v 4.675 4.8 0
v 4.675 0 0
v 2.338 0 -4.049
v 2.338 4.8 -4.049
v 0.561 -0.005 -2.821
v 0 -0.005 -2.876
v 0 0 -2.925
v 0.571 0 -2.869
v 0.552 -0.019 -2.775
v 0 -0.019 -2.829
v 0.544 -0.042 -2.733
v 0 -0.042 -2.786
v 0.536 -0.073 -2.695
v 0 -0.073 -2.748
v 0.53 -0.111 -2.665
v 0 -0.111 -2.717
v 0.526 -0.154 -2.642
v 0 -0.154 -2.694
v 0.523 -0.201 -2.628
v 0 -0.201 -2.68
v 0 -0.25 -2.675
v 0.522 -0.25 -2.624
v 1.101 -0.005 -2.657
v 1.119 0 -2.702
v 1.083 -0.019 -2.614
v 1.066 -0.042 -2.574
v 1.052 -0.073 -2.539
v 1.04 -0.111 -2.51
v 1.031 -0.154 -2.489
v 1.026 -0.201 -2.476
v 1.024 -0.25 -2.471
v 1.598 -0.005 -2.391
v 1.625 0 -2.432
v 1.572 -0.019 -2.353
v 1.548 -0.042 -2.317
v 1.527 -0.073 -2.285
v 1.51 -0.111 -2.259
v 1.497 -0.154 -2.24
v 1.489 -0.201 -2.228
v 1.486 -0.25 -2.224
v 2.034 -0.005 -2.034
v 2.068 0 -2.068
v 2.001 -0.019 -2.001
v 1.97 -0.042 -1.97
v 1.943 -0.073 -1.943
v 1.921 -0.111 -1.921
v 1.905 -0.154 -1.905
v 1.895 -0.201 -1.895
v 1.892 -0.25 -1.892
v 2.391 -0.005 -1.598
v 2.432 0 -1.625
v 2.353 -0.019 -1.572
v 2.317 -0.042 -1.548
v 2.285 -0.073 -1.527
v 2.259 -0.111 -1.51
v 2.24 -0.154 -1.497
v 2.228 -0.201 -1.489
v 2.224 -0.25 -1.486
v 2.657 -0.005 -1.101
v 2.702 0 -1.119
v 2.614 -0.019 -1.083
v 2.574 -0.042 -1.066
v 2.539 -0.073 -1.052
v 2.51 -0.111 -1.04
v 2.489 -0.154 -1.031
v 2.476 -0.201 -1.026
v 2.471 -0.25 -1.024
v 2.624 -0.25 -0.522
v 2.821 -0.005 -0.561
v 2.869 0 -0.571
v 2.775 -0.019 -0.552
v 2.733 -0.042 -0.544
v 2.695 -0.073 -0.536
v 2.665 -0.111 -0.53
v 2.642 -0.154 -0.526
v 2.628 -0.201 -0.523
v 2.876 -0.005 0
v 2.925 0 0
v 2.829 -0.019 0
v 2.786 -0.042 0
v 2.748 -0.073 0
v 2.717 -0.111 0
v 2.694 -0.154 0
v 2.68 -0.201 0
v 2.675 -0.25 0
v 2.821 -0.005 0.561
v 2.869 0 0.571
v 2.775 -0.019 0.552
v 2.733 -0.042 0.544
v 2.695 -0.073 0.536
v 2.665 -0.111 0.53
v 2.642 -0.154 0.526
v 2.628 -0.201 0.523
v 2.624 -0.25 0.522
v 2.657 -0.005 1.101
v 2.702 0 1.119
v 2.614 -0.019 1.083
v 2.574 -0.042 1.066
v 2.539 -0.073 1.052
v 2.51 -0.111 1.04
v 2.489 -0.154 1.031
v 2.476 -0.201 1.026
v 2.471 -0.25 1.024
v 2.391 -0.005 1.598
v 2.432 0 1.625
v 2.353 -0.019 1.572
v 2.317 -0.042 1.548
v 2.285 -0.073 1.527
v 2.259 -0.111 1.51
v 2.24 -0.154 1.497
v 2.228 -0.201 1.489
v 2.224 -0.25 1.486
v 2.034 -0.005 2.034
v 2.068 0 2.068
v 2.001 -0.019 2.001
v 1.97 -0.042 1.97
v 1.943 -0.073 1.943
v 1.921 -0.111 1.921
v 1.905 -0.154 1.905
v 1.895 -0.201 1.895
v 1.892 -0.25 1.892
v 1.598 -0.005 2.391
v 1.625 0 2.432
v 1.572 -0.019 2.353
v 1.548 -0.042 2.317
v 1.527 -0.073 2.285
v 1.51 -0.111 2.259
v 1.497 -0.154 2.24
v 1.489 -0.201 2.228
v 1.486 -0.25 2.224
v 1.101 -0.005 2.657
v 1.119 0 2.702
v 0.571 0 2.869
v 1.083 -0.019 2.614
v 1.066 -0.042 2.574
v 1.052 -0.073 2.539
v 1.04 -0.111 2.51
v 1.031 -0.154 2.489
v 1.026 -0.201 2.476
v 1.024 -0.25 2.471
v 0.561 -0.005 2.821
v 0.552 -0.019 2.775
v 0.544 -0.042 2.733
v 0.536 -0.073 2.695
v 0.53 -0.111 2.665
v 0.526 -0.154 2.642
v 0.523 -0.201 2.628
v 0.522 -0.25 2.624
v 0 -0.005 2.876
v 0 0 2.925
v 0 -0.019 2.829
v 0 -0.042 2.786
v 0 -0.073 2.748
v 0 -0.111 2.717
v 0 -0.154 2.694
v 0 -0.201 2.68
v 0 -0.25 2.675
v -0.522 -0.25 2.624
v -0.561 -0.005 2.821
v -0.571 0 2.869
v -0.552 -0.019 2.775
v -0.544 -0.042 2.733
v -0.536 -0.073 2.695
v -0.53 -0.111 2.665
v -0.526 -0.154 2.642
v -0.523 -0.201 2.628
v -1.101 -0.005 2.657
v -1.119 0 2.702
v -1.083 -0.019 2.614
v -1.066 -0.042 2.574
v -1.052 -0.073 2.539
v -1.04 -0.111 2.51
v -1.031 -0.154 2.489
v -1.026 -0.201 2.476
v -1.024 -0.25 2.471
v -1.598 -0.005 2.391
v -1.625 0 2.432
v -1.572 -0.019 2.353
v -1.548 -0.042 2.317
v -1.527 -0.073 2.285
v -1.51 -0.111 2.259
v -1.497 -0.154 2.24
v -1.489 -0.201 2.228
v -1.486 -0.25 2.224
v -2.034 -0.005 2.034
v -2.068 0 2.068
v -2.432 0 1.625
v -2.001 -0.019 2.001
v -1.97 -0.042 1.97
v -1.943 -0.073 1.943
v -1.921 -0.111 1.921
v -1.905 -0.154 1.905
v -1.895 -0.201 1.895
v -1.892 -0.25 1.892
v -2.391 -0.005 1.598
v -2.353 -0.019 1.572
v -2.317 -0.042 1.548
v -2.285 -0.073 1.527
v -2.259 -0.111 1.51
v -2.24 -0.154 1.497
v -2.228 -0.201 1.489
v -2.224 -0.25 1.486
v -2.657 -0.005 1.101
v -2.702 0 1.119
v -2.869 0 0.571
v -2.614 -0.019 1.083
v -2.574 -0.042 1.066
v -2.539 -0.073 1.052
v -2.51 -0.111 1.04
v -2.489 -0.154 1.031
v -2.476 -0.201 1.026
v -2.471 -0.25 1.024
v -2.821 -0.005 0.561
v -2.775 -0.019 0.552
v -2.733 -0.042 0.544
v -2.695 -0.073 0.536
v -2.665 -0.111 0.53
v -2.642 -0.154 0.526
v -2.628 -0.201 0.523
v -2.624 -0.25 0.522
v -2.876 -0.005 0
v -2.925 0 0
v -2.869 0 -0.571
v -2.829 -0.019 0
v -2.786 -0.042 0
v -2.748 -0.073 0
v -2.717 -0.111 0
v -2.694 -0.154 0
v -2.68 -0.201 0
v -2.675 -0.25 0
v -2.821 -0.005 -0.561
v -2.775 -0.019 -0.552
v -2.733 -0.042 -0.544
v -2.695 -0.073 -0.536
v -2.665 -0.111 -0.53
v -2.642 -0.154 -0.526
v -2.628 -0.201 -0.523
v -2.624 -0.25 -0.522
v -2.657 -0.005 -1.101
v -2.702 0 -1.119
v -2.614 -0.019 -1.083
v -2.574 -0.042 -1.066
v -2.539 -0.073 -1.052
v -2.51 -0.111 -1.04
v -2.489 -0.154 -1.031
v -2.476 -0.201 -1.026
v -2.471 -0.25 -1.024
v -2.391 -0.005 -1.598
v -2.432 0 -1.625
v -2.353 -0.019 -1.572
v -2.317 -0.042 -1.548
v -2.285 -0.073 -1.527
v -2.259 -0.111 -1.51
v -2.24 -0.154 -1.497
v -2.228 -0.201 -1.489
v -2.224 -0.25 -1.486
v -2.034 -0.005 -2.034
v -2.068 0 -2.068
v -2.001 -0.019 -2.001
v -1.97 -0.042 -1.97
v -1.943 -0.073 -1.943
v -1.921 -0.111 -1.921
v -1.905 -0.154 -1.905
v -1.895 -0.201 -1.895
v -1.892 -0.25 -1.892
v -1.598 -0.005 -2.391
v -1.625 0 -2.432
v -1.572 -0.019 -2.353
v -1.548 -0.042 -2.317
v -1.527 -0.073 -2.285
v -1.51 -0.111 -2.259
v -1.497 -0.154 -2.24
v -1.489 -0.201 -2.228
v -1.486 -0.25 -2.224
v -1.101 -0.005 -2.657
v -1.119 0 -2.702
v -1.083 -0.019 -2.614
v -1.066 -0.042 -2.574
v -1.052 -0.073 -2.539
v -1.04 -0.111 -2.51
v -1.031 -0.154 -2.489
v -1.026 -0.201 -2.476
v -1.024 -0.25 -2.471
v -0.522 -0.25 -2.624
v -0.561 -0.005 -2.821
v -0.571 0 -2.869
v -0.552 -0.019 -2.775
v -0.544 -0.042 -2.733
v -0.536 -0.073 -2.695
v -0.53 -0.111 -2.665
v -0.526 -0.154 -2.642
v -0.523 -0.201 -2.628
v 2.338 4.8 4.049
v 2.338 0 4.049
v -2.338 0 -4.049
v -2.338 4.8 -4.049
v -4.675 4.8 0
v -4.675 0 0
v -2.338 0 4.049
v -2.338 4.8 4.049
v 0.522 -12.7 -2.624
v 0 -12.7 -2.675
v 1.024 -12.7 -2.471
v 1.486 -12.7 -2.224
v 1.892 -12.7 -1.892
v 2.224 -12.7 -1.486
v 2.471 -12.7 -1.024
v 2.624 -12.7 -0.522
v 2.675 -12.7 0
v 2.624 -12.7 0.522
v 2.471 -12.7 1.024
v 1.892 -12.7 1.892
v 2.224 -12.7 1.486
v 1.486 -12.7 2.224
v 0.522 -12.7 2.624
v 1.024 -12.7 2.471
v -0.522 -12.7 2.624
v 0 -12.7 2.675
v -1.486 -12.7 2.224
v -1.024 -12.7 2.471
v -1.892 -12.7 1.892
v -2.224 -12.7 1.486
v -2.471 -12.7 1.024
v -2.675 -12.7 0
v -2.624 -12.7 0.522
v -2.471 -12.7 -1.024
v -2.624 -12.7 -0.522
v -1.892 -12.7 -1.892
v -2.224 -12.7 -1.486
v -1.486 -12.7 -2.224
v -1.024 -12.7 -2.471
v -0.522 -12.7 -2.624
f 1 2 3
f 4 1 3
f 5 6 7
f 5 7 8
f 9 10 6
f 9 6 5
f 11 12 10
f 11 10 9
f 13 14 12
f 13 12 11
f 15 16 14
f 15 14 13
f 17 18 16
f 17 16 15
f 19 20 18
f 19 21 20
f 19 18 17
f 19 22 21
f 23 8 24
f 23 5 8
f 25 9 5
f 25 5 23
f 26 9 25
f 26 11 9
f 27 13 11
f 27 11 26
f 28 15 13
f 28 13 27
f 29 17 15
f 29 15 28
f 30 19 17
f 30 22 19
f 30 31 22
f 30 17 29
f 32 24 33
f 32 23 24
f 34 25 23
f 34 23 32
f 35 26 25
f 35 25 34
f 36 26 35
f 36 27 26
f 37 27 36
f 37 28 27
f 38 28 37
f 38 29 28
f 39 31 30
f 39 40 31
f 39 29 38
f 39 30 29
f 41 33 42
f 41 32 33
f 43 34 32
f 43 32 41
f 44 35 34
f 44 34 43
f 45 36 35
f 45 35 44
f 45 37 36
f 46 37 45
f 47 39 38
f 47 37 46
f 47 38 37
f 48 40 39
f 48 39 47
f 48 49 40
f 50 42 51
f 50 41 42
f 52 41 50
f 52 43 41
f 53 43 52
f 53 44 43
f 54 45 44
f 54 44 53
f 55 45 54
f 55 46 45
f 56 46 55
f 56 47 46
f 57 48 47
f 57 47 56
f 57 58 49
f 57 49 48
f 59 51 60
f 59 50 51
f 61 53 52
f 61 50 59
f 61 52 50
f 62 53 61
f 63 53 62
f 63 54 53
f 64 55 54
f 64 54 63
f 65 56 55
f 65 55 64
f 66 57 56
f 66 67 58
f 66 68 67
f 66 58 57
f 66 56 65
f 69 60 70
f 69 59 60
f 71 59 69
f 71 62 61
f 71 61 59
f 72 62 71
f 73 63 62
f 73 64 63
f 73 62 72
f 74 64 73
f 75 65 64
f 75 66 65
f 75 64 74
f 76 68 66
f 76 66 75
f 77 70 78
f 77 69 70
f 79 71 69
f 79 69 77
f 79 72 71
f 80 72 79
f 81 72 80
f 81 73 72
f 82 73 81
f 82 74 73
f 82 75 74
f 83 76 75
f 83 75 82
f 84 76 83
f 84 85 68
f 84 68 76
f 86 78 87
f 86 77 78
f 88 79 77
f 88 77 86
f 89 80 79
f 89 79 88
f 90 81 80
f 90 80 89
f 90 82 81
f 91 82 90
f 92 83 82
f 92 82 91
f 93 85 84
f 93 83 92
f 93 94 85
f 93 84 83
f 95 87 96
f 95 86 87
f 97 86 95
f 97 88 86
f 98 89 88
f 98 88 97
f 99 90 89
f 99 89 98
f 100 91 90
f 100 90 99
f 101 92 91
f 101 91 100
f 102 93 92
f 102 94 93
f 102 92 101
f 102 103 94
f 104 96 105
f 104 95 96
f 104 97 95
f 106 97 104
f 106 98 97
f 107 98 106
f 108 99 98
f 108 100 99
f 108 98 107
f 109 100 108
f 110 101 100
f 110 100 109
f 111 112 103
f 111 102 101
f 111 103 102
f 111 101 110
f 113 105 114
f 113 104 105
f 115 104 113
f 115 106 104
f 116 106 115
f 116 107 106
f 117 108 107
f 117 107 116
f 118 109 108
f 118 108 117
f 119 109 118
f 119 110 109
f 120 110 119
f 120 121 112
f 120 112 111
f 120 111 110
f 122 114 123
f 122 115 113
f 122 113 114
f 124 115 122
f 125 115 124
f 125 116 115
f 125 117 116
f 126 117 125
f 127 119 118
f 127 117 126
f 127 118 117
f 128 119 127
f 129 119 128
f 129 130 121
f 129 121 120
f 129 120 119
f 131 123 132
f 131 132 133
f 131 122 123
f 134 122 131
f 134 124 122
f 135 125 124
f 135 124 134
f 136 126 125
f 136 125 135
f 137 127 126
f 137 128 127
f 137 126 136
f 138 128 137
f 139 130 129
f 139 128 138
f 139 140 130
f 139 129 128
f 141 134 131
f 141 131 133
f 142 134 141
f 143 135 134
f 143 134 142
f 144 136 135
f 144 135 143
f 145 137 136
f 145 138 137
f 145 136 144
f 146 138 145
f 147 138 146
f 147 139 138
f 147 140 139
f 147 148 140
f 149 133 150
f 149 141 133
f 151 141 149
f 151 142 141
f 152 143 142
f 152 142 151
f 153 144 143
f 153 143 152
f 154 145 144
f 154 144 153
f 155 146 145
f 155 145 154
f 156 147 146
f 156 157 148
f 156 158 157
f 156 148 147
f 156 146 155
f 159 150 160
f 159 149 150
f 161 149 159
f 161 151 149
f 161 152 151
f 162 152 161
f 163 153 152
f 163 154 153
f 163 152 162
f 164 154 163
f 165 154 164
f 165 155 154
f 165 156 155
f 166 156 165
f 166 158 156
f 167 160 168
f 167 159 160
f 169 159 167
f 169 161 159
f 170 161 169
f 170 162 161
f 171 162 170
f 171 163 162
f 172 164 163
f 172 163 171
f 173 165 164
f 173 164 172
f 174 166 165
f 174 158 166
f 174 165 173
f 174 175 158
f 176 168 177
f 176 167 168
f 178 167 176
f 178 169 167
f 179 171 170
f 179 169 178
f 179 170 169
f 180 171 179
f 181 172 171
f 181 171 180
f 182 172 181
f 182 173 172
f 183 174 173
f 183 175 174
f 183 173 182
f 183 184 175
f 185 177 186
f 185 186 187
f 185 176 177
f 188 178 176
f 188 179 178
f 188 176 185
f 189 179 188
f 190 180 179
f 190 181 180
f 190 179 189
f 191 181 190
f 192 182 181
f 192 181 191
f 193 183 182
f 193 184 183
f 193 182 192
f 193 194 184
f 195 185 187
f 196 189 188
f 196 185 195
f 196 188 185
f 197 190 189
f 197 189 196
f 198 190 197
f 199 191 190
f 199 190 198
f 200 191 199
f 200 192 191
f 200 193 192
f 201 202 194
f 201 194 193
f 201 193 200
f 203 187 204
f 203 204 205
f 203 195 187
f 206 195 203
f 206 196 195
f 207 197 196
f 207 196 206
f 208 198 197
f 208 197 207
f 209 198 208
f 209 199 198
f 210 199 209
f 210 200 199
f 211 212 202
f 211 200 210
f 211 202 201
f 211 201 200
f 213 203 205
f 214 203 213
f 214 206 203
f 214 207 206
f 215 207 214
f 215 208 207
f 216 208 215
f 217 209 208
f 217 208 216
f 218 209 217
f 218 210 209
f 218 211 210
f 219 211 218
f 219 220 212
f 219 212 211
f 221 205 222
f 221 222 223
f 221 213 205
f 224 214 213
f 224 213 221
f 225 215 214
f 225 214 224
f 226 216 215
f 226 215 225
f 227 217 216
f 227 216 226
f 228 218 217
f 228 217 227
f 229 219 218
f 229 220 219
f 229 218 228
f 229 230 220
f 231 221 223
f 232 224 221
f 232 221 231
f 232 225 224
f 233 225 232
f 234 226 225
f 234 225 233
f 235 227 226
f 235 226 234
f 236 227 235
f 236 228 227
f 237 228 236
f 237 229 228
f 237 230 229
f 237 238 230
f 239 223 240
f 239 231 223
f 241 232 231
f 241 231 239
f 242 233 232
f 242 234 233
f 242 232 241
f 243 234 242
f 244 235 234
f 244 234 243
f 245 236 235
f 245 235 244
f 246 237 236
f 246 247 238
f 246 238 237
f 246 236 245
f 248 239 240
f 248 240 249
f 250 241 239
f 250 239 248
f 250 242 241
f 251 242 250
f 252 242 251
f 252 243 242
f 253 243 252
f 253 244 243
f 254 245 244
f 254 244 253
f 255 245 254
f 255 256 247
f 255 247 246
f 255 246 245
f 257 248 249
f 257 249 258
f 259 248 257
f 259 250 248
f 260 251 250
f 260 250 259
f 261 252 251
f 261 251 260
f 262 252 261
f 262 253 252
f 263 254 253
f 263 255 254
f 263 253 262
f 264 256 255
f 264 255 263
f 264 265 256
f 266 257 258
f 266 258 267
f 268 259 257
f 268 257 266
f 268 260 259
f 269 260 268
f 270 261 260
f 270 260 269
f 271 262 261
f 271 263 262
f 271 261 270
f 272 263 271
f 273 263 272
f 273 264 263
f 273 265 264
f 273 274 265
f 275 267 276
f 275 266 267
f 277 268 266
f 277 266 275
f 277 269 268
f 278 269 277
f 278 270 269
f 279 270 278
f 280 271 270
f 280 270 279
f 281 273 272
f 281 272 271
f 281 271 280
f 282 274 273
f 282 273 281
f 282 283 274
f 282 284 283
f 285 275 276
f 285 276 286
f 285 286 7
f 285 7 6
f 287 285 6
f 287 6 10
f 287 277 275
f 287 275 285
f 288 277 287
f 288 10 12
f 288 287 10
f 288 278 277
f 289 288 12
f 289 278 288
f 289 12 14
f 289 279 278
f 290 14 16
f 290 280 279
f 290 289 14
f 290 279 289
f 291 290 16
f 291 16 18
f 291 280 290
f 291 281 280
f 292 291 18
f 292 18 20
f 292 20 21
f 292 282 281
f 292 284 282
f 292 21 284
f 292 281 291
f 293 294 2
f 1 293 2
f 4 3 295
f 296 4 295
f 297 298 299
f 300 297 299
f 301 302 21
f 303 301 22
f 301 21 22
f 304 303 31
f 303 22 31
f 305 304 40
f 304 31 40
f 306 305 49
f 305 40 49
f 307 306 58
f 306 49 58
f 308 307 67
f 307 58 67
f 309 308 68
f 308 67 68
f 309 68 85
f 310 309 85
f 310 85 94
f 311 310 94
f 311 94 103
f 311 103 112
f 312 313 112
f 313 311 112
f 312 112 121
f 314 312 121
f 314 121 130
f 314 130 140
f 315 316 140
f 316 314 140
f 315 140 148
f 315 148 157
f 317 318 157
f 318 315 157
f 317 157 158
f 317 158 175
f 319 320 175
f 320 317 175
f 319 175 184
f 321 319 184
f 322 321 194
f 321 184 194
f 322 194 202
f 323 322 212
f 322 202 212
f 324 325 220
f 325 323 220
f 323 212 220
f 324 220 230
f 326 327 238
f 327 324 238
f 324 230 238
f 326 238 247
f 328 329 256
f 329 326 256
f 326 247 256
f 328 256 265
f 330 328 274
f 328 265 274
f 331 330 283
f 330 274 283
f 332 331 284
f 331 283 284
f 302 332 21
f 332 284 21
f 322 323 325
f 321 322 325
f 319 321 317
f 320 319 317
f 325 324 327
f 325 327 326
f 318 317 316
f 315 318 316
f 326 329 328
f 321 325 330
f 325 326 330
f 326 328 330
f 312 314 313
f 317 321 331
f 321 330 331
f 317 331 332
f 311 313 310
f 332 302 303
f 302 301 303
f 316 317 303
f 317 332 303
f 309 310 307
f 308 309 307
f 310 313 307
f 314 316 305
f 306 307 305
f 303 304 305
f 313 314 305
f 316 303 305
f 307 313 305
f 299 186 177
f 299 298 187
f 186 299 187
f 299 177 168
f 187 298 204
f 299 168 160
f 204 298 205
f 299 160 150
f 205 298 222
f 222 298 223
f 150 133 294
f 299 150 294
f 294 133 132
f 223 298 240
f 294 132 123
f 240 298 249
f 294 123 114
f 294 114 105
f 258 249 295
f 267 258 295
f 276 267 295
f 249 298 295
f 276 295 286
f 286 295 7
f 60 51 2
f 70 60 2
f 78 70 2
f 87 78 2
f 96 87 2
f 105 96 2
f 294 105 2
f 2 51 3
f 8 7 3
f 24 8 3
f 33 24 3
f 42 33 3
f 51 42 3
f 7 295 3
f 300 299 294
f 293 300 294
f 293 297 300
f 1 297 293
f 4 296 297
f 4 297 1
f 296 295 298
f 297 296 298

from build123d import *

# Parameters (mm, degrees)
BOSS_EXTRUDE1_DEPTH     = 4.8
SKETCH3_R               = 2.675
BOSS_EXTRUDE2_DEPTH     = 28.7
FILLET1_R               = 0.25
CUT_EXTRUDE1_DEPTH      = 30.358769452
CUT_EXTRUDE1_DEPTH_BACK = 30.358769452
SKETCH4_W               = 15.294544115
SKETCH4_H               = 19.173595159


with BuildPart() as part:
    # Sketch2 → Boss-Extrude1 (new body)
    with BuildSketch(Plane(origin=(0, 0, 0), x_dir=(1, 0, 0), z_dir=(0, 1, 0))):
        Polygon((-2.3375, 4.048668763), (-4.675, 0), (-2.3375, -4.048668763), (2.3375, -4.048668763), (4.675, 0), (2.3375, 4.048668763), align=None)
    extrude(amount=BOSS_EXTRUDE1_DEPTH)

    # Sketch3 → Boss-Extrude2 (add)
    with BuildSketch(Plane.XZ):
        with Locations(Location((0, 0, 0), (0, 0, 270))):
            Circle(SKETCH3_R)
    extrude(amount=BOSS_EXTRUDE2_DEPTH)

    # Fillet1
    fillet1_edges = [part.edges().sort_by_distance(p)[0] for p in [
        (0, 0, 2.675),
    ]]
    fillet(fillet1_edges, radius=FILLET1_R)

    # Sketch4 → Cut-Extrude1 (cut, two sides: drawn at the far end of the back side and taken through both)
    with BuildSketch(Plane.XY.offset(-CUT_EXTRUDE1_DEPTH_BACK)):
        with Locations((0.498735134, -22.286797579)):
            Rectangle(SKETCH4_W, SKETCH4_H)
    extrude(amount=CUT_EXTRUDE1_DEPTH + CUT_EXTRUDE1_DEPTH_BACK, mode=Mode.SUBTRACT)


solid = part.part
